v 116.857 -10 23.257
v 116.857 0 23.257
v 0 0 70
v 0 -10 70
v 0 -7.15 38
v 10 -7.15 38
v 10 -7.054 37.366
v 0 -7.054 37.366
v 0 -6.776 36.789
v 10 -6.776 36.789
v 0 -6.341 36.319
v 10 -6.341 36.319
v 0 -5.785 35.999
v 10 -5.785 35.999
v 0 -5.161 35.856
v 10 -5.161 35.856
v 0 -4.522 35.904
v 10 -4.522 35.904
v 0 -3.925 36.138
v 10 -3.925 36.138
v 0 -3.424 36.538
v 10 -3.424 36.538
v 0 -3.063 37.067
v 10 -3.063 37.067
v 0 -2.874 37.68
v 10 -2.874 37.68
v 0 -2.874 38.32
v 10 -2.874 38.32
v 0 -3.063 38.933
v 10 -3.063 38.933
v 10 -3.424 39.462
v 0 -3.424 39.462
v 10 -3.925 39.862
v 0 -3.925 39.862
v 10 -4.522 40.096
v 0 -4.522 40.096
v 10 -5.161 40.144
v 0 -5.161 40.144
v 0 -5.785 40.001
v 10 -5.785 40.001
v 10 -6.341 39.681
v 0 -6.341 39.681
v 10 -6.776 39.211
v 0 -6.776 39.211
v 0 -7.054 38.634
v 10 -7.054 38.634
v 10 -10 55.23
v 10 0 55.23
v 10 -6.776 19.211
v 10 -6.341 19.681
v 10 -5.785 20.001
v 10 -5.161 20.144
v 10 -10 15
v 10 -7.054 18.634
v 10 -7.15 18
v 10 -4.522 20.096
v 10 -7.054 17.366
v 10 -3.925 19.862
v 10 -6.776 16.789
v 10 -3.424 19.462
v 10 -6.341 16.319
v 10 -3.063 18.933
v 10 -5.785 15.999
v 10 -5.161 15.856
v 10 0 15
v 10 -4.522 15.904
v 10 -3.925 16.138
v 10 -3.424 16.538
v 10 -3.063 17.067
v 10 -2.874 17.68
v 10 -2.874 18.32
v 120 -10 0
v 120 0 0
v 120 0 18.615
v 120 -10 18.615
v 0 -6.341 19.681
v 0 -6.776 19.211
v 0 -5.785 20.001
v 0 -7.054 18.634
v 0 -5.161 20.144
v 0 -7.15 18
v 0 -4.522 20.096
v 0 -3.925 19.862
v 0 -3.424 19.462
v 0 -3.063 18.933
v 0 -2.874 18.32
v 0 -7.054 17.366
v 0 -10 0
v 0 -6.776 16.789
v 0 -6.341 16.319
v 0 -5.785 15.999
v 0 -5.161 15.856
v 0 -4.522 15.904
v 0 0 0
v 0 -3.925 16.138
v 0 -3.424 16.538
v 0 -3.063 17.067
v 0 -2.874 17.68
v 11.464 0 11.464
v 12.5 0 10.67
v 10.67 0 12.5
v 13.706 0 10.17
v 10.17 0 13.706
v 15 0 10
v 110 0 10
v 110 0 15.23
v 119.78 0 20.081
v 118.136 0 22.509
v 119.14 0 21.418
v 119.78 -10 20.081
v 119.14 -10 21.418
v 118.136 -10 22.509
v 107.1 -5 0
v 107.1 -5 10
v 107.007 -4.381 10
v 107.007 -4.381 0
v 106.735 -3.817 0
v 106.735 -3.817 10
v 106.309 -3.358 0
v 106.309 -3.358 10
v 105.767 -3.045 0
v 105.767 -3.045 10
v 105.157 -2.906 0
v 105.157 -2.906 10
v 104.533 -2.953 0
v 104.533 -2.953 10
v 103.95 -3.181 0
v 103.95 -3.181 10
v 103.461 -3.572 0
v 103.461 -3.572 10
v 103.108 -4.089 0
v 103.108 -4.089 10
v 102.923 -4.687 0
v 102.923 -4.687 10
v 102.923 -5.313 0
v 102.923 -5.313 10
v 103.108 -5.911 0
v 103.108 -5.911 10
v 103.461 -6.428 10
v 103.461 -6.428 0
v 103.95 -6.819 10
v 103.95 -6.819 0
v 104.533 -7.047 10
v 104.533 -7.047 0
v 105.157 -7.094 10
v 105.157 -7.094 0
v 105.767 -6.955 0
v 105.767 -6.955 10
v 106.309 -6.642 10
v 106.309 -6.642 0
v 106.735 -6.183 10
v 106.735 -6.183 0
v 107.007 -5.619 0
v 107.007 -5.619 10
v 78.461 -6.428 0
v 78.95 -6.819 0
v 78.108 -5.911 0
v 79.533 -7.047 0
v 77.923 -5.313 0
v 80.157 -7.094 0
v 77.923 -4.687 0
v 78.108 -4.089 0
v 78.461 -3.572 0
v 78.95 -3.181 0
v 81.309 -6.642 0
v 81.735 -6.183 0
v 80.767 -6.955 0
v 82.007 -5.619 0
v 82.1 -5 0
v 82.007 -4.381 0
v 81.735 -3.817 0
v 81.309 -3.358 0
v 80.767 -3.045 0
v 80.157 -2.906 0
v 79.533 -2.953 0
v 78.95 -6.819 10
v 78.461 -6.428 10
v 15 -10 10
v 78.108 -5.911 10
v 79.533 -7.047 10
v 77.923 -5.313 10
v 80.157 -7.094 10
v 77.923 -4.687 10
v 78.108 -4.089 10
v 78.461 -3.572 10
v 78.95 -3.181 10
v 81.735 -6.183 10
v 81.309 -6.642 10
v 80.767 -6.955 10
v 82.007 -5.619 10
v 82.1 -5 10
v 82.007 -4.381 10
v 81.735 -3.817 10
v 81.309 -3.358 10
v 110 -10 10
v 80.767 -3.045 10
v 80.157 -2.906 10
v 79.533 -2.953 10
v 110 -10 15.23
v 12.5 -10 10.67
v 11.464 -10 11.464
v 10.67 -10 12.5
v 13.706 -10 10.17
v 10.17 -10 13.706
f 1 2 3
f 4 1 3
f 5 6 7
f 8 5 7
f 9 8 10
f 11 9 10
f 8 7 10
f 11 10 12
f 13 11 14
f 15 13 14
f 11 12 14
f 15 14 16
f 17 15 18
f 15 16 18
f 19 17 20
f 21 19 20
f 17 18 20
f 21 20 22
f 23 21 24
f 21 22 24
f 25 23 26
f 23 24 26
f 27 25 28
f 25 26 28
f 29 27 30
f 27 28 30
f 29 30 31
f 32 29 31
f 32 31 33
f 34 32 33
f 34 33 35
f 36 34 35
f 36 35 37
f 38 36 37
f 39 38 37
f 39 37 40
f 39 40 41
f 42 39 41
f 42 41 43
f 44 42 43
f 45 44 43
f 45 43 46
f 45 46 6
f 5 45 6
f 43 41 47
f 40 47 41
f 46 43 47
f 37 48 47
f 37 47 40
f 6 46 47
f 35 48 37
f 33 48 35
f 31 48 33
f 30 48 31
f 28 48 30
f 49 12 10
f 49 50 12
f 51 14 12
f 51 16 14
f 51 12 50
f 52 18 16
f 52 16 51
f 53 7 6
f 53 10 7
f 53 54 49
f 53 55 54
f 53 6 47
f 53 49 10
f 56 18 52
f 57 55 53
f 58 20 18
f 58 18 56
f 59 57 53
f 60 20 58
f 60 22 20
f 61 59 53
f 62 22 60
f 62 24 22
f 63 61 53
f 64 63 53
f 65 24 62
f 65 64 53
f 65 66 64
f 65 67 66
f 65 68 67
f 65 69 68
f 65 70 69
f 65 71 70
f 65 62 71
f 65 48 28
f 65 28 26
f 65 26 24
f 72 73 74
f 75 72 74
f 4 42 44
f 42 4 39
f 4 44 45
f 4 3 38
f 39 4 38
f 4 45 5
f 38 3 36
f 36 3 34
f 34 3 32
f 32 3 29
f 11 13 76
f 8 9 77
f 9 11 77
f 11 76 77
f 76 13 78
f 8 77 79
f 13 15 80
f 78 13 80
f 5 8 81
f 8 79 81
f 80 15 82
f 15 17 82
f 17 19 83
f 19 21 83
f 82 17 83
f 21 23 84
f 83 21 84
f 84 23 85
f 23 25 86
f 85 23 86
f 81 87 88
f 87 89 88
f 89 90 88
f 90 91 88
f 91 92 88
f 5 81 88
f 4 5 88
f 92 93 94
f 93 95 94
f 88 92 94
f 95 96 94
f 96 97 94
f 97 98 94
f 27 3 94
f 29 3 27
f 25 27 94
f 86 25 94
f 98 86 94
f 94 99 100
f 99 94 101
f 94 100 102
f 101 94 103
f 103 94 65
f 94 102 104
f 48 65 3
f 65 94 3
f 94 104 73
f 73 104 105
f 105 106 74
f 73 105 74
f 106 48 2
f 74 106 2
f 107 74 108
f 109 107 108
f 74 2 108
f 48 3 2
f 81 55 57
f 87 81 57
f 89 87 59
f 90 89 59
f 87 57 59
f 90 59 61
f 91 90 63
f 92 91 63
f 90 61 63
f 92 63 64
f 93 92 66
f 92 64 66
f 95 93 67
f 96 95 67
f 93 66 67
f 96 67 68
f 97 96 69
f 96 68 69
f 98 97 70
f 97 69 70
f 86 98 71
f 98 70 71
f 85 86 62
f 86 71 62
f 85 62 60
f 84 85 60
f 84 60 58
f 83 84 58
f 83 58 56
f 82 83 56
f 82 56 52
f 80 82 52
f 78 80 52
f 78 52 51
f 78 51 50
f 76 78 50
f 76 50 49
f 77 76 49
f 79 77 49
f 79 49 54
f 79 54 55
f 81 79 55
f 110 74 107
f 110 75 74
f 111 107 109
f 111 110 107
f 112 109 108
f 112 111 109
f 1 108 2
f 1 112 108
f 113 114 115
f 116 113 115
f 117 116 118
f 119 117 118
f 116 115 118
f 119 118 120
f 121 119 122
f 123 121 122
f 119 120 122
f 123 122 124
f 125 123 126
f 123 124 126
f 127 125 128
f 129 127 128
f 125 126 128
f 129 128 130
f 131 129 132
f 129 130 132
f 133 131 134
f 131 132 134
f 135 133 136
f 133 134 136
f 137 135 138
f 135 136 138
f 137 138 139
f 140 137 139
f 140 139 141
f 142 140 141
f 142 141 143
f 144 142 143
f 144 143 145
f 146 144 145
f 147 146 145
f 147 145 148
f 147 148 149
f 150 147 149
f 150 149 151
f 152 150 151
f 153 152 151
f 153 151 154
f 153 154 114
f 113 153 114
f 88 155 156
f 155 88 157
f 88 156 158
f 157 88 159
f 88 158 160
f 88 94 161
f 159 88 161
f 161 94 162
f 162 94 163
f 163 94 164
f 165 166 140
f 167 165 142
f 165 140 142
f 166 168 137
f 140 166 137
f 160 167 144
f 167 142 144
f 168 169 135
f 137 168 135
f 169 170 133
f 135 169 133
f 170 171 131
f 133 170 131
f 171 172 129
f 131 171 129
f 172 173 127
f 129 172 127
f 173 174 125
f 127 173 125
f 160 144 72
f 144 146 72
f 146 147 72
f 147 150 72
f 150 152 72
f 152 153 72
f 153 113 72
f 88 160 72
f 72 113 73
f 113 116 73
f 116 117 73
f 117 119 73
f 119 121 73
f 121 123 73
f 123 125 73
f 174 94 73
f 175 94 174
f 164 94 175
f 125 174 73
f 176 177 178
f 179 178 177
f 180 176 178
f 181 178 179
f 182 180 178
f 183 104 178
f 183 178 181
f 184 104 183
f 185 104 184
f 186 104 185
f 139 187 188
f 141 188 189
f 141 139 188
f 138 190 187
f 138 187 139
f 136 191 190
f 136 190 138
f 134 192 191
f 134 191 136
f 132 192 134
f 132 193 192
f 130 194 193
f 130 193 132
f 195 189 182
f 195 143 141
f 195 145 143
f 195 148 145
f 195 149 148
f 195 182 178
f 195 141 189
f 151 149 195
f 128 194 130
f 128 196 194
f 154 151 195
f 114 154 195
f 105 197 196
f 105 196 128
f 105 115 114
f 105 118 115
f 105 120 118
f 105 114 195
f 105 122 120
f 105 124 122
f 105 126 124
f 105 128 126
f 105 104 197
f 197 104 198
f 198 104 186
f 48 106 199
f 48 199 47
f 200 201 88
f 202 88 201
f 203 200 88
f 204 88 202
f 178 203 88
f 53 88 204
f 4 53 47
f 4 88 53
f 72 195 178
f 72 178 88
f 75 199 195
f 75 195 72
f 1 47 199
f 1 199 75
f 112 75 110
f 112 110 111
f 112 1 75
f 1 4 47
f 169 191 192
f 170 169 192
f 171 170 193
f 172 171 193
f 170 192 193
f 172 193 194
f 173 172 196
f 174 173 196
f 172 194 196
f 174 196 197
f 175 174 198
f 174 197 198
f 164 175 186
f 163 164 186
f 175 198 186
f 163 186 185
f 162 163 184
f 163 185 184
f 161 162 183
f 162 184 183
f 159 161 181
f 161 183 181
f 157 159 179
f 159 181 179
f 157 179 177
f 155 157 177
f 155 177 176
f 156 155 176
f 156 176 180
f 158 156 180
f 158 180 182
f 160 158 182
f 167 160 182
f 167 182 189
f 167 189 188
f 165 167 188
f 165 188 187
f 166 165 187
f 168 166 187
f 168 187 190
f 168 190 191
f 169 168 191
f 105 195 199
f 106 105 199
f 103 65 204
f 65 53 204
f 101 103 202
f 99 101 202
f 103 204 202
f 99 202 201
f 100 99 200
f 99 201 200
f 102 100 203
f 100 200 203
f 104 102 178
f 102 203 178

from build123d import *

# Parameters (mm, degrees)
F1_DEPTH = 10
F2_R     = 5
F4_DEPTH = 10.001
F5_R     = 5
F7_D     = 4.2
F7_DEPTH = 10.001
F9_D     = 4.3
F9_DEPTH = 15
F9_TIP   = 1.2918503309


with BuildPart() as f1:
    # F0 (on Front) → F1 (new body)
    with BuildSketch(Plane.XZ):
        Polygon((0, 70), (0, 0), (120, 0), (120, 22), align=None)
    extrude(amount=F1_DEPTH)

    # F2
    f2_edges = [f1.edges().sort_by_distance(p)[0] for p in [
        (120, -5, 22),
    ]]
    fillet(f2_edges, radius=F2_R)

    # F3 (on Front) → F4 (cut, through all)
    with BuildSketch(Plane.XZ):
        Polygon((10, 55.2296703857), (10, 10), (110, 10), (110, 15.2296703857), align=None)
    extrude(amount=F4_DEPTH, mode=Mode.SUBTRACT)

    # F5
    f5_edges = [f1.edges().sort_by_distance(p)[0] for p in [
        (10, -5, 10),
    ]]
    fillet(f5_edges, radius=F5_R)

    # F7 (through all, one way)
    with BuildSketch(Plane.XY.offset(10)):
        with Locations((80, -5), (105, -5)):
            Circle(F7_D / 2)
    extrude(amount=-F7_DEPTH, mode=Mode.SUBTRACT)

    # F9
    with Locations(Plane(origin=(0, 0, 0), x_dir=(0, 1, 0), z_dir=(-1, 0, 0))):
        with Locations((-5, -38), (-5, -18)):
            Hole(F9_D / 2, depth=F9_DEPTH)
            with Locations((0, 0, -(F9_DEPTH + F9_TIP / 2))):  # 118° drill point
                Cone(0, F9_D / 2, F9_TIP, mode=Mode.SUBTRACT)


solid = f1.part
